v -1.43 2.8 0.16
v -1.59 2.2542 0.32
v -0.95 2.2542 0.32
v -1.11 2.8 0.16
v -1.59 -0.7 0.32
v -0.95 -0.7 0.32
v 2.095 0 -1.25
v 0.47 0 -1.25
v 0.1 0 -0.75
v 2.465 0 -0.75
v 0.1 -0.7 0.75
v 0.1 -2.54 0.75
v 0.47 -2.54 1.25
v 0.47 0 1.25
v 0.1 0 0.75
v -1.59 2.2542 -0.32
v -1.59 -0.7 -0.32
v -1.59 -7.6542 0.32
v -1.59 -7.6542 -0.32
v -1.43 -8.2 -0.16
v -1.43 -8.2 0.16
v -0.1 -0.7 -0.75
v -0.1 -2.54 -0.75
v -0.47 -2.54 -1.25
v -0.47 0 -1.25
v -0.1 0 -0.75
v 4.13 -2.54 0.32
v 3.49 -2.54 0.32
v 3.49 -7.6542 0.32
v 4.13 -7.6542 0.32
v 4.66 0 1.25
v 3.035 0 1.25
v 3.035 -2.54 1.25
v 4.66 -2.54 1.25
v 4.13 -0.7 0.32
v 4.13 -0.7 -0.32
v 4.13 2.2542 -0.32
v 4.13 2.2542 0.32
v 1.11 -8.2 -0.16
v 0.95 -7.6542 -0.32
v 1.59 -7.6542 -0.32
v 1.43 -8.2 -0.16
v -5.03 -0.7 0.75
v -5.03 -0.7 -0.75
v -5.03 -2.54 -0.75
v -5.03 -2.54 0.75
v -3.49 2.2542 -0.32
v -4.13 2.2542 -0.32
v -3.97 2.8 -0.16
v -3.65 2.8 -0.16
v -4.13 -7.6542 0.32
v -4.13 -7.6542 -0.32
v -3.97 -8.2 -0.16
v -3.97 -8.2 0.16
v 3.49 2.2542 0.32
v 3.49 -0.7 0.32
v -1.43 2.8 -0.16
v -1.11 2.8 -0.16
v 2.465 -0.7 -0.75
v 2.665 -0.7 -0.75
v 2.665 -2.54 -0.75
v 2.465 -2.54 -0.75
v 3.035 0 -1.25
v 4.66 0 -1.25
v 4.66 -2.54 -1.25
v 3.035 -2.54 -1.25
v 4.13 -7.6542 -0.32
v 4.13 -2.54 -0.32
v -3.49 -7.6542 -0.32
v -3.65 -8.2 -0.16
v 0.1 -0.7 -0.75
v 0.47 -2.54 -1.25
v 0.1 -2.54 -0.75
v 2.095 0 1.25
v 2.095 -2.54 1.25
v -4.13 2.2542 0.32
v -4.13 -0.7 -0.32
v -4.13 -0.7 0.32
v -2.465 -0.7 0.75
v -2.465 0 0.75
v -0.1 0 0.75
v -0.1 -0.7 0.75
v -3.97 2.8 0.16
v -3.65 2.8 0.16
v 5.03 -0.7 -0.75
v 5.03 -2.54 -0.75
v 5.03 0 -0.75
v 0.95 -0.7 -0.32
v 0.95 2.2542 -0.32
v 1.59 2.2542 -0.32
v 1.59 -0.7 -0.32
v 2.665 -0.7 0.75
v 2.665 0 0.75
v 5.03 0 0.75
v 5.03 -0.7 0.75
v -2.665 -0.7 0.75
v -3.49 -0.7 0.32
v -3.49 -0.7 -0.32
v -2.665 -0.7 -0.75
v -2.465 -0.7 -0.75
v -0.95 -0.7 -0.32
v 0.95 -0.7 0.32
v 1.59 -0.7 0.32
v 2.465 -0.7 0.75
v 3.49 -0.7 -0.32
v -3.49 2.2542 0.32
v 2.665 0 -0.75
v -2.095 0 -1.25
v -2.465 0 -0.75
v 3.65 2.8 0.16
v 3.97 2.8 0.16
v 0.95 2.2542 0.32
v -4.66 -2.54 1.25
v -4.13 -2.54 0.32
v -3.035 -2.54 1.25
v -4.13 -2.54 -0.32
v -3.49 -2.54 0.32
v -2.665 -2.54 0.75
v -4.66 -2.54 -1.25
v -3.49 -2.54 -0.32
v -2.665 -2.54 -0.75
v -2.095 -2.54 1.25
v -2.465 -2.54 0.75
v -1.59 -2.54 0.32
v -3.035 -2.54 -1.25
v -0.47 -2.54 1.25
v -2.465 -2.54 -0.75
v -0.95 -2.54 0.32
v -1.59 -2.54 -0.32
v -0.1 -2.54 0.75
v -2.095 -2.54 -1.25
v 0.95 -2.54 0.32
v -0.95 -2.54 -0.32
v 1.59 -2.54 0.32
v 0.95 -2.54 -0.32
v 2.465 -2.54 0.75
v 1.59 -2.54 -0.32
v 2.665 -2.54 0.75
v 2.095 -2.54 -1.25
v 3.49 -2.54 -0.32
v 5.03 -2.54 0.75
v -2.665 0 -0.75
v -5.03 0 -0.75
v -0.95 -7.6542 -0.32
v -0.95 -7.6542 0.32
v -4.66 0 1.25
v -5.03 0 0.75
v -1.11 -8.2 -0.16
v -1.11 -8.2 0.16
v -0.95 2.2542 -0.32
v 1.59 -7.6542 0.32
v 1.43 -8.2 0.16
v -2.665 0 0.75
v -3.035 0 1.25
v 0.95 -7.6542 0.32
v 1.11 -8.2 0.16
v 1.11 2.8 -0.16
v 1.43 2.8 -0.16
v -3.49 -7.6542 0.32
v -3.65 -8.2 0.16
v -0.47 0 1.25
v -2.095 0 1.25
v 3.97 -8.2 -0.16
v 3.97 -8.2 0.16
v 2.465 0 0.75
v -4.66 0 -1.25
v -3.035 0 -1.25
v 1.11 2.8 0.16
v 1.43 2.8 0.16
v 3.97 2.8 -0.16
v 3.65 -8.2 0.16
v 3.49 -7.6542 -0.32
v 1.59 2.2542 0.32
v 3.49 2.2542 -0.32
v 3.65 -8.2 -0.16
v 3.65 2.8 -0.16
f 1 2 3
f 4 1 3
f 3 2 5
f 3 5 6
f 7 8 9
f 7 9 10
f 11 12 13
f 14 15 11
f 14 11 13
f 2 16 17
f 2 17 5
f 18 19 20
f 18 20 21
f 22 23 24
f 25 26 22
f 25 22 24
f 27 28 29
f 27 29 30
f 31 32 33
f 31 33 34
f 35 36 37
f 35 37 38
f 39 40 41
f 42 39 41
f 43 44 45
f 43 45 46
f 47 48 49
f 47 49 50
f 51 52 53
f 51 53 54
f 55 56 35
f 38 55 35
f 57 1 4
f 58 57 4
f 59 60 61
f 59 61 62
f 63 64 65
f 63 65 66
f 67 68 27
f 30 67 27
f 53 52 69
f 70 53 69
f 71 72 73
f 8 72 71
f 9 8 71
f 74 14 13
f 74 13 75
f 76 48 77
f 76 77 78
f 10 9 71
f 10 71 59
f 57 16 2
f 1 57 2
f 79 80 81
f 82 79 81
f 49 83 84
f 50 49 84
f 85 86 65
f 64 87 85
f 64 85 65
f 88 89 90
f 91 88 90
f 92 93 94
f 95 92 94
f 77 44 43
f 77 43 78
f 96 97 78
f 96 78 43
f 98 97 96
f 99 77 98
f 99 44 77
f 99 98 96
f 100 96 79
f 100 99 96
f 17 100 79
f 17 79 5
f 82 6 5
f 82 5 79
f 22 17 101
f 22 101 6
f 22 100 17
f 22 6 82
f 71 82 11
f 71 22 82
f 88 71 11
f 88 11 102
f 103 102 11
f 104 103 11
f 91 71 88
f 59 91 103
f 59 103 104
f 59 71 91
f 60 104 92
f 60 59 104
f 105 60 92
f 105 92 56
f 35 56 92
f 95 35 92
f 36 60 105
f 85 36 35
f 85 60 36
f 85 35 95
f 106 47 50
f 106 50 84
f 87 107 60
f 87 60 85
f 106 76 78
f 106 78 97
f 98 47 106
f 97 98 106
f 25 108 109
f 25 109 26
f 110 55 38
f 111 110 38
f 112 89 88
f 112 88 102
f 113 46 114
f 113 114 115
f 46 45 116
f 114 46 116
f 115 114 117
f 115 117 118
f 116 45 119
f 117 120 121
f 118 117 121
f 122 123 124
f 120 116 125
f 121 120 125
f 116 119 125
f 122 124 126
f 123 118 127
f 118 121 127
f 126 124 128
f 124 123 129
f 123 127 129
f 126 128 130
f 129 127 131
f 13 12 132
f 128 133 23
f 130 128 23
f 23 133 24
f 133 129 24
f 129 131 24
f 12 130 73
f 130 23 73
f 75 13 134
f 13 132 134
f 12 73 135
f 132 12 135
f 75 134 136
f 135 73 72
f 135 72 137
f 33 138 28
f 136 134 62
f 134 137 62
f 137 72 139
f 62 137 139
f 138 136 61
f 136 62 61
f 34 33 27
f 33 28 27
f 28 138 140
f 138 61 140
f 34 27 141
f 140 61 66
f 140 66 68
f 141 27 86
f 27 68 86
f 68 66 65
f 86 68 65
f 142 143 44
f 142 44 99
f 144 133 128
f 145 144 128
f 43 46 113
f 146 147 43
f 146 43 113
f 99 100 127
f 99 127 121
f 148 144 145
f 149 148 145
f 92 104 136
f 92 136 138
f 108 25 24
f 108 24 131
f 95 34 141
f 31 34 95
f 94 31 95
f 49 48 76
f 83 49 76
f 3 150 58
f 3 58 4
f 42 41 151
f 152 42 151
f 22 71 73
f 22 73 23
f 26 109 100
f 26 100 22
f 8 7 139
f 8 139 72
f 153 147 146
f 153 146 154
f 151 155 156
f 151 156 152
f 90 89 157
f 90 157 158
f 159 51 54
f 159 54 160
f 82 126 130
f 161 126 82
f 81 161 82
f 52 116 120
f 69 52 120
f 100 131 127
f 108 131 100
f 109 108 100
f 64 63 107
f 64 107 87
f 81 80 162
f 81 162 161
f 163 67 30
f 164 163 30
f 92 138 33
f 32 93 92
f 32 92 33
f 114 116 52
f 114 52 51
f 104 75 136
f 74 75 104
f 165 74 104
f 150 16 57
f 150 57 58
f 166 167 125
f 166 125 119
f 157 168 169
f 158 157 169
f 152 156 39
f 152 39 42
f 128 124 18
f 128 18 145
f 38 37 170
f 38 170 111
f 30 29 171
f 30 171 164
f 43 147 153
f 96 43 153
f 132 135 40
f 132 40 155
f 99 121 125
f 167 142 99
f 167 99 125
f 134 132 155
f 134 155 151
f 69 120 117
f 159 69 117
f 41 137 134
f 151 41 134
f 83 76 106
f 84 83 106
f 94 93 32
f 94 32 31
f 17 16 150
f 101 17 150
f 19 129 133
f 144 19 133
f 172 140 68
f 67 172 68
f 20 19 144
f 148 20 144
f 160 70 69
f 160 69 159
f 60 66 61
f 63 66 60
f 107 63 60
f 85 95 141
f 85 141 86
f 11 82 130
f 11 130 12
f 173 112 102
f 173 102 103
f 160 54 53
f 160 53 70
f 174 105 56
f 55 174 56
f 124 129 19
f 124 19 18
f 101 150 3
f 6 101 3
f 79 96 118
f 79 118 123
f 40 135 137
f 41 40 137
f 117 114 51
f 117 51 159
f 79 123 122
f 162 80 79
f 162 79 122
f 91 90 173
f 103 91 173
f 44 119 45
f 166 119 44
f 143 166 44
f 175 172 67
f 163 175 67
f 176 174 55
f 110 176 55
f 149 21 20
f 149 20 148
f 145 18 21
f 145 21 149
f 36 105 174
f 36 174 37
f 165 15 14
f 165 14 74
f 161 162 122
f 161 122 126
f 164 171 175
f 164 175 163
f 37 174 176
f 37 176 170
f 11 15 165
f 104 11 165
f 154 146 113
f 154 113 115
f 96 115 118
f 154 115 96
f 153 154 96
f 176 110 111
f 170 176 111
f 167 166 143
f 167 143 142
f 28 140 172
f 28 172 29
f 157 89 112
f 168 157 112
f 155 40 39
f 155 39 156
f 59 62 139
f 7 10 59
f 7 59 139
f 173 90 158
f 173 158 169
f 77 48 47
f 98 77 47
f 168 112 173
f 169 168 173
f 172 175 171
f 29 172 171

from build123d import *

# Parameters (mm, degrees)
BOSS_EXTRUDE1_DEPTH      = 2.54
SKETCH5_W                = 10.06
SKETCH5_H                = 1.5
CUT_EXTRUDE3_DEPTH       = 0.7
SKETCH3_W                = 0.64
SKETCH3_H                = 0.64
CUT_EXTRUDE2_DEPTH       = 3.54
SKETCH4_W                = 0.64
SKETCH4_H                = 0.64
BOSS_EXTRUDE2_DEPTH      = 8.2
BOSS_EXTRUDE2_DEPTH_BACK = 2.8
CHAMFER1_SIZE            = 0.16
CHAMFER1_SIZE2           = 0.5458
CHAMFER1_PART_2_SIZE     = 0.16
CHAMFER1_PART_2_SIZE2    = 0.5458
CHAMFER1_PART_3_SIZE     = 0.16
CHAMFER1_PART_3_SIZE2    = 0.5458
CHAMFER1_PART_4_SIZE     = 0.16
CHAMFER1_PART_4_SIZE2    = 0.5458
CHAMFER2_SIZE            = 0.16
CHAMFER2_SIZE2           = 0.5458
CHAMFER2_PART_2_SIZE     = 0.16
CHAMFER2_PART_2_SIZE2    = 0.5458
CHAMFER2_PART_3_SIZE     = 0.16
CHAMFER2_PART_3_SIZE2    = 0.5458
CHAMFER2_PART_4_SIZE     = 0.16
CHAMFER2_PART_4_SIZE2    = 0.5458


with BuildPart() as part:
    # Sketch1 → Boss-Extrude1 (new body)
    with BuildSketch(Plane(origin=(0, 0, 0), x_dir=(1, 0, 0), z_dir=(0, 1, 0))):
        Polygon((-4.660019462, -1.25), (-3.034980538, -1.25), (-2.665, -0.75), (-2.465, -0.75), (-2.095019462, -1.25), (-0.469980538, -1.25), (-0.1, -0.75), (0.1, -0.75), (0.469980538, -1.25), (2.095019462, -1.25), (2.465, -0.75), (2.665, -0.75), (3.034980538, -1.25), (4.660019462, -1.25), (5.03, -0.75), (5.03, 0.75), (4.660019462, 1.25), (3.034980538, 1.25), (2.665, 0.75), (2.465, 0.75), (2.095019462, 1.25), (0.469980538, 1.25), (0.1, 0.75), (-0.1, 0.75), (-0.469980538, 1.25), (-2.095019462, 1.25), (-2.465, 0.75), (-2.665, 0.75), (-3.034980538, 1.25), (-4.660019462, 1.25), (-5.03, 0.75), (-5.03, -0.75), align=None)
    extrude(amount=-BOSS_EXTRUDE1_DEPTH)

    # Sketch5 → Cut-Extrude3 (cut)
    with BuildSketch(Plane(origin=(0, 0, 0), x_dir=(1, 0, 0), z_dir=(0, 1, 0))):
        Rectangle(SKETCH5_W, SKETCH5_H)
    extrude(amount=-CUT_EXTRUDE3_DEPTH, mode=Mode.SUBTRACT)

    # Sketch3 → Cut-Extrude2 (cut, through all)
    with BuildSketch(Plane(origin=(0, -2.54, 0), x_dir=(-1, 0, 0), z_dir=(0, -1, 0))):
        with Locations((-3.81, 0)):
            Rectangle(SKETCH3_W, SKETCH3_H)
        with Locations((-1.27, 0)):
            Rectangle(SKETCH3_W, SKETCH3_H)
        with Locations((1.27, 0)):
            Rectangle(SKETCH3_W, SKETCH3_H)
        with Locations((3.81, 0)):
            Rectangle(SKETCH3_W, SKETCH3_H)
    extrude(amount=-CUT_EXTRUDE2_DEPTH, mode=Mode.SUBTRACT)

    # Sketch4 → Boss-Extrude2 (add, two sides)
    with BuildSketch(Plane.XZ) as boss_extrude2_sk:
        with Locations((3.81, 0)):
            Rectangle(SKETCH4_W, SKETCH4_H)
        with Locations((1.27, 0)):
            Rectangle(SKETCH4_W, SKETCH4_H)
        with Locations((-1.27, 0)):
            Rectangle(SKETCH4_W, SKETCH4_H)
        with Locations((-3.81, 0)):
            Rectangle(SKETCH4_W, SKETCH4_H)
    extrude(amount=BOSS_EXTRUDE2_DEPTH)
    extrude(boss_extrude2_sk.sketch, amount=-BOSS_EXTRUDE2_DEPTH_BACK)

    # Chamfer1
    chamfer1_edges = [part.edges().sort_by_distance(p)[0] for p in [
        (3.49, -8.2, 0),
        (3.81, -8.2, -0.32),
        (4.13, -8.2, 0),
        (3.81, -8.2, 0.32),
    ]]
    chamfer1_side = [part.faces().sort_by_distance(p)[0] for p in [
        (3.81, -8.2, 0),
    ]]
    chamfer(chamfer1_edges, length=CHAMFER1_SIZE, length2=CHAMFER1_SIZE2, reference=chamfer1_side[0])

    # Chamfer1 part 2
    chamfer1_part_2_edges = [part.edges().sort_by_distance(p)[0] for p in [
        (0.95, -8.2, 0),
        (1.27, -8.2, -0.32),
        (1.59, -8.2, 0),
        (1.27, -8.2, 0.32),
    ]]
    chamfer1_part_2_side = [part.faces().sort_by_distance(p)[0] for p in [
        (1.27, -8.2, 0),
    ]]
    chamfer(chamfer1_part_2_edges, length=CHAMFER1_PART_2_SIZE, length2=CHAMFER1_PART_2_SIZE2, reference=chamfer1_part_2_side[0])

    # Chamfer1 part 3
    chamfer1_part_3_edges = [part.edges().sort_by_distance(p)[0] for p in [
        (-1.59, -8.2, 0),
        (-1.27, -8.2, -0.32),
        (-0.95, -8.2, 0),
        (-1.27, -8.2, 0.32),
    ]]
    chamfer1_part_3_side = [part.faces().sort_by_distance(p)[0] for p in [
        (-1.27, -8.2, 0),
    ]]
    chamfer(chamfer1_part_3_edges, length=CHAMFER1_PART_3_SIZE, length2=CHAMFER1_PART_3_SIZE2, reference=chamfer1_part_3_side[0])

    # Chamfer1 part 4
    chamfer1_part_4_edges = [part.edges().sort_by_distance(p)[0] for p in [
        (-4.13, -8.2, 0),
        (-3.81, -8.2, -0.32),
        (-3.49, -8.2, 0),
        (-3.81, -8.2, 0.32),
    ]]
    chamfer1_part_4_side = [part.faces().sort_by_distance(p)[0] for p in [
        (-3.81, -8.2, 0),
    ]]
    chamfer(chamfer1_part_4_edges, length=CHAMFER1_PART_4_SIZE, length2=CHAMFER1_PART_4_SIZE2, reference=chamfer1_part_4_side[0])

    # Chamfer2
    chamfer2_edges = [part.edges().sort_by_distance(p)[0] for p in [
        (3.49, 2.8, 0),
        (3.81, 2.8, -0.32),
        (4.13, 2.8, 0),
        (3.81, 2.8, 0.32),
    ]]
    chamfer2_side = [part.faces().sort_by_distance(p)[0] for p in [
        (3.81, 2.8, 0),
    ]]
    chamfer(chamfer2_edges, length=CHAMFER2_SIZE, length2=CHAMFER2_SIZE2, reference=chamfer2_side[0])

    # Chamfer2 part 2
    chamfer2_part_2_edges = [part.edges().sort_by_distance(p)[0] for p in [
        (0.95, 2.8, 0),
        (1.27, 2.8, -0.32),
        (1.59, 2.8, 0),
        (1.27, 2.8, 0.32),
    ]]
    chamfer2_part_2_side = [part.faces().sort_by_distance(p)[0] for p in [
        (1.27, 2.8, 0),
    ]]
    chamfer(chamfer2_part_2_edges, length=CHAMFER2_PART_2_SIZE, length2=CHAMFER2_PART_2_SIZE2, reference=chamfer2_part_2_side[0])

    # Chamfer2 part 3
    chamfer2_part_3_edges = [part.edges().sort_by_distance(p)[0] for p in [
        (-1.59, 2.8, 0),
        (-1.27, 2.8, -0.32),
        (-0.95, 2.8, 0),
        (-1.27, 2.8, 0.32),
    ]]
    chamfer2_part_3_side = [part.faces().sort_by_distance(p)[0] for p in [
        (-1.27, 2.8, 0),
    ]]
    chamfer(chamfer2_part_3_edges, length=CHAMFER2_PART_3_SIZE, length2=CHAMFER2_PART_3_SIZE2, reference=chamfer2_part_3_side[0])

    # Chamfer2 part 4
    chamfer2_part_4_edges = [part.edges().sort_by_distance(p)[0] for p in [
        (-4.13, 2.8, 0),
        (-3.81, 2.8, -0.32),
        (-3.49, 2.8, 0),
        (-3.81, 2.8, 0.32),
    ]]
    chamfer2_part_4_side = [part.faces().sort_by_distance(p)[0] for p in [
        (-3.81, 2.8, 0),
    ]]
    chamfer(chamfer2_part_4_edges, length=CHAMFER2_PART_4_SIZE, length2=CHAMFER2_PART_4_SIZE2, reference=chamfer2_part_4_side[0])


solid = part.part
